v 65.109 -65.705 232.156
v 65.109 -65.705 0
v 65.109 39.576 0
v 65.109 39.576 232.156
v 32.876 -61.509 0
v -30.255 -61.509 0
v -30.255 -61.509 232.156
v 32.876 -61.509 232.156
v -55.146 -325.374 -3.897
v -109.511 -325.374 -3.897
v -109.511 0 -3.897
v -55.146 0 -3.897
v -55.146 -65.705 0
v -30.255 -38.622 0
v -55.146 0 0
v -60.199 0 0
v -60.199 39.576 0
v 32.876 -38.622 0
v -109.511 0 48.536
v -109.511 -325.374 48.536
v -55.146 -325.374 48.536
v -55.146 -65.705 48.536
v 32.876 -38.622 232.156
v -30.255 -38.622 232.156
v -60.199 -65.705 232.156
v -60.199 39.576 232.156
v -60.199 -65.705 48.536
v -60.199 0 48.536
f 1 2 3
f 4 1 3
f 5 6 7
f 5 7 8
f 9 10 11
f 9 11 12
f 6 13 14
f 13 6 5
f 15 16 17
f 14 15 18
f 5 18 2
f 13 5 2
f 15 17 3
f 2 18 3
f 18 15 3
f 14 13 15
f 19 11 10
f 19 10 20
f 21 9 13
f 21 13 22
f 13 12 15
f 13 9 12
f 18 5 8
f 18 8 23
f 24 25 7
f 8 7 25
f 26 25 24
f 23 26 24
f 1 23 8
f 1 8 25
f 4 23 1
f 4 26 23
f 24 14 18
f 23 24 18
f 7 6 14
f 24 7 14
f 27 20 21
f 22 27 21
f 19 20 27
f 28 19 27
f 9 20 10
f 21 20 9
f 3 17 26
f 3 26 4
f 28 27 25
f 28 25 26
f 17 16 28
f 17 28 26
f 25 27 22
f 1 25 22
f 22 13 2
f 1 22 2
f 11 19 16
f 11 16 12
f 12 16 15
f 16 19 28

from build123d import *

# Parameters (mm, degrees)
F0_W     = 54.3647520244
F0_H     = 52.432758268
F2_DEPTH = 325.374
F1_W     = 125.3076829016
F1_H     = 105.2813343704
F1_W_2   = 63.1306562573
F1_H_2   = 22.8872485459
F1_R     = 36.1337810963
F3_DEPTH = 232.156


with BuildPart() as f2:
    # F0 (on Front) → F2 (new body)
    with BuildSketch(Plane.XZ):
        with Locations((-82.3284629732, 22.3198619206)):
            Rectangle(F0_W, F0_H)
    extrude(amount=F2_DEPTH)

    # F1 (on Top) → F3 (join)
    with BuildSketch(Plane.XY):
        with Locations((2.4547781795, -13.0648035556)):
            Rectangle(F1_W, F1_H)
        with Locations((1.3104146346, -50.0658545643)):
            Rectangle(F1_W_2, F1_H_2, mode=Mode.SUBTRACT)
        Circle(F1_R, mode=Mode.SUBTRACT)
        Circle(F1_R)
    extrude(amount=F3_DEPTH)


solid = f2.part
